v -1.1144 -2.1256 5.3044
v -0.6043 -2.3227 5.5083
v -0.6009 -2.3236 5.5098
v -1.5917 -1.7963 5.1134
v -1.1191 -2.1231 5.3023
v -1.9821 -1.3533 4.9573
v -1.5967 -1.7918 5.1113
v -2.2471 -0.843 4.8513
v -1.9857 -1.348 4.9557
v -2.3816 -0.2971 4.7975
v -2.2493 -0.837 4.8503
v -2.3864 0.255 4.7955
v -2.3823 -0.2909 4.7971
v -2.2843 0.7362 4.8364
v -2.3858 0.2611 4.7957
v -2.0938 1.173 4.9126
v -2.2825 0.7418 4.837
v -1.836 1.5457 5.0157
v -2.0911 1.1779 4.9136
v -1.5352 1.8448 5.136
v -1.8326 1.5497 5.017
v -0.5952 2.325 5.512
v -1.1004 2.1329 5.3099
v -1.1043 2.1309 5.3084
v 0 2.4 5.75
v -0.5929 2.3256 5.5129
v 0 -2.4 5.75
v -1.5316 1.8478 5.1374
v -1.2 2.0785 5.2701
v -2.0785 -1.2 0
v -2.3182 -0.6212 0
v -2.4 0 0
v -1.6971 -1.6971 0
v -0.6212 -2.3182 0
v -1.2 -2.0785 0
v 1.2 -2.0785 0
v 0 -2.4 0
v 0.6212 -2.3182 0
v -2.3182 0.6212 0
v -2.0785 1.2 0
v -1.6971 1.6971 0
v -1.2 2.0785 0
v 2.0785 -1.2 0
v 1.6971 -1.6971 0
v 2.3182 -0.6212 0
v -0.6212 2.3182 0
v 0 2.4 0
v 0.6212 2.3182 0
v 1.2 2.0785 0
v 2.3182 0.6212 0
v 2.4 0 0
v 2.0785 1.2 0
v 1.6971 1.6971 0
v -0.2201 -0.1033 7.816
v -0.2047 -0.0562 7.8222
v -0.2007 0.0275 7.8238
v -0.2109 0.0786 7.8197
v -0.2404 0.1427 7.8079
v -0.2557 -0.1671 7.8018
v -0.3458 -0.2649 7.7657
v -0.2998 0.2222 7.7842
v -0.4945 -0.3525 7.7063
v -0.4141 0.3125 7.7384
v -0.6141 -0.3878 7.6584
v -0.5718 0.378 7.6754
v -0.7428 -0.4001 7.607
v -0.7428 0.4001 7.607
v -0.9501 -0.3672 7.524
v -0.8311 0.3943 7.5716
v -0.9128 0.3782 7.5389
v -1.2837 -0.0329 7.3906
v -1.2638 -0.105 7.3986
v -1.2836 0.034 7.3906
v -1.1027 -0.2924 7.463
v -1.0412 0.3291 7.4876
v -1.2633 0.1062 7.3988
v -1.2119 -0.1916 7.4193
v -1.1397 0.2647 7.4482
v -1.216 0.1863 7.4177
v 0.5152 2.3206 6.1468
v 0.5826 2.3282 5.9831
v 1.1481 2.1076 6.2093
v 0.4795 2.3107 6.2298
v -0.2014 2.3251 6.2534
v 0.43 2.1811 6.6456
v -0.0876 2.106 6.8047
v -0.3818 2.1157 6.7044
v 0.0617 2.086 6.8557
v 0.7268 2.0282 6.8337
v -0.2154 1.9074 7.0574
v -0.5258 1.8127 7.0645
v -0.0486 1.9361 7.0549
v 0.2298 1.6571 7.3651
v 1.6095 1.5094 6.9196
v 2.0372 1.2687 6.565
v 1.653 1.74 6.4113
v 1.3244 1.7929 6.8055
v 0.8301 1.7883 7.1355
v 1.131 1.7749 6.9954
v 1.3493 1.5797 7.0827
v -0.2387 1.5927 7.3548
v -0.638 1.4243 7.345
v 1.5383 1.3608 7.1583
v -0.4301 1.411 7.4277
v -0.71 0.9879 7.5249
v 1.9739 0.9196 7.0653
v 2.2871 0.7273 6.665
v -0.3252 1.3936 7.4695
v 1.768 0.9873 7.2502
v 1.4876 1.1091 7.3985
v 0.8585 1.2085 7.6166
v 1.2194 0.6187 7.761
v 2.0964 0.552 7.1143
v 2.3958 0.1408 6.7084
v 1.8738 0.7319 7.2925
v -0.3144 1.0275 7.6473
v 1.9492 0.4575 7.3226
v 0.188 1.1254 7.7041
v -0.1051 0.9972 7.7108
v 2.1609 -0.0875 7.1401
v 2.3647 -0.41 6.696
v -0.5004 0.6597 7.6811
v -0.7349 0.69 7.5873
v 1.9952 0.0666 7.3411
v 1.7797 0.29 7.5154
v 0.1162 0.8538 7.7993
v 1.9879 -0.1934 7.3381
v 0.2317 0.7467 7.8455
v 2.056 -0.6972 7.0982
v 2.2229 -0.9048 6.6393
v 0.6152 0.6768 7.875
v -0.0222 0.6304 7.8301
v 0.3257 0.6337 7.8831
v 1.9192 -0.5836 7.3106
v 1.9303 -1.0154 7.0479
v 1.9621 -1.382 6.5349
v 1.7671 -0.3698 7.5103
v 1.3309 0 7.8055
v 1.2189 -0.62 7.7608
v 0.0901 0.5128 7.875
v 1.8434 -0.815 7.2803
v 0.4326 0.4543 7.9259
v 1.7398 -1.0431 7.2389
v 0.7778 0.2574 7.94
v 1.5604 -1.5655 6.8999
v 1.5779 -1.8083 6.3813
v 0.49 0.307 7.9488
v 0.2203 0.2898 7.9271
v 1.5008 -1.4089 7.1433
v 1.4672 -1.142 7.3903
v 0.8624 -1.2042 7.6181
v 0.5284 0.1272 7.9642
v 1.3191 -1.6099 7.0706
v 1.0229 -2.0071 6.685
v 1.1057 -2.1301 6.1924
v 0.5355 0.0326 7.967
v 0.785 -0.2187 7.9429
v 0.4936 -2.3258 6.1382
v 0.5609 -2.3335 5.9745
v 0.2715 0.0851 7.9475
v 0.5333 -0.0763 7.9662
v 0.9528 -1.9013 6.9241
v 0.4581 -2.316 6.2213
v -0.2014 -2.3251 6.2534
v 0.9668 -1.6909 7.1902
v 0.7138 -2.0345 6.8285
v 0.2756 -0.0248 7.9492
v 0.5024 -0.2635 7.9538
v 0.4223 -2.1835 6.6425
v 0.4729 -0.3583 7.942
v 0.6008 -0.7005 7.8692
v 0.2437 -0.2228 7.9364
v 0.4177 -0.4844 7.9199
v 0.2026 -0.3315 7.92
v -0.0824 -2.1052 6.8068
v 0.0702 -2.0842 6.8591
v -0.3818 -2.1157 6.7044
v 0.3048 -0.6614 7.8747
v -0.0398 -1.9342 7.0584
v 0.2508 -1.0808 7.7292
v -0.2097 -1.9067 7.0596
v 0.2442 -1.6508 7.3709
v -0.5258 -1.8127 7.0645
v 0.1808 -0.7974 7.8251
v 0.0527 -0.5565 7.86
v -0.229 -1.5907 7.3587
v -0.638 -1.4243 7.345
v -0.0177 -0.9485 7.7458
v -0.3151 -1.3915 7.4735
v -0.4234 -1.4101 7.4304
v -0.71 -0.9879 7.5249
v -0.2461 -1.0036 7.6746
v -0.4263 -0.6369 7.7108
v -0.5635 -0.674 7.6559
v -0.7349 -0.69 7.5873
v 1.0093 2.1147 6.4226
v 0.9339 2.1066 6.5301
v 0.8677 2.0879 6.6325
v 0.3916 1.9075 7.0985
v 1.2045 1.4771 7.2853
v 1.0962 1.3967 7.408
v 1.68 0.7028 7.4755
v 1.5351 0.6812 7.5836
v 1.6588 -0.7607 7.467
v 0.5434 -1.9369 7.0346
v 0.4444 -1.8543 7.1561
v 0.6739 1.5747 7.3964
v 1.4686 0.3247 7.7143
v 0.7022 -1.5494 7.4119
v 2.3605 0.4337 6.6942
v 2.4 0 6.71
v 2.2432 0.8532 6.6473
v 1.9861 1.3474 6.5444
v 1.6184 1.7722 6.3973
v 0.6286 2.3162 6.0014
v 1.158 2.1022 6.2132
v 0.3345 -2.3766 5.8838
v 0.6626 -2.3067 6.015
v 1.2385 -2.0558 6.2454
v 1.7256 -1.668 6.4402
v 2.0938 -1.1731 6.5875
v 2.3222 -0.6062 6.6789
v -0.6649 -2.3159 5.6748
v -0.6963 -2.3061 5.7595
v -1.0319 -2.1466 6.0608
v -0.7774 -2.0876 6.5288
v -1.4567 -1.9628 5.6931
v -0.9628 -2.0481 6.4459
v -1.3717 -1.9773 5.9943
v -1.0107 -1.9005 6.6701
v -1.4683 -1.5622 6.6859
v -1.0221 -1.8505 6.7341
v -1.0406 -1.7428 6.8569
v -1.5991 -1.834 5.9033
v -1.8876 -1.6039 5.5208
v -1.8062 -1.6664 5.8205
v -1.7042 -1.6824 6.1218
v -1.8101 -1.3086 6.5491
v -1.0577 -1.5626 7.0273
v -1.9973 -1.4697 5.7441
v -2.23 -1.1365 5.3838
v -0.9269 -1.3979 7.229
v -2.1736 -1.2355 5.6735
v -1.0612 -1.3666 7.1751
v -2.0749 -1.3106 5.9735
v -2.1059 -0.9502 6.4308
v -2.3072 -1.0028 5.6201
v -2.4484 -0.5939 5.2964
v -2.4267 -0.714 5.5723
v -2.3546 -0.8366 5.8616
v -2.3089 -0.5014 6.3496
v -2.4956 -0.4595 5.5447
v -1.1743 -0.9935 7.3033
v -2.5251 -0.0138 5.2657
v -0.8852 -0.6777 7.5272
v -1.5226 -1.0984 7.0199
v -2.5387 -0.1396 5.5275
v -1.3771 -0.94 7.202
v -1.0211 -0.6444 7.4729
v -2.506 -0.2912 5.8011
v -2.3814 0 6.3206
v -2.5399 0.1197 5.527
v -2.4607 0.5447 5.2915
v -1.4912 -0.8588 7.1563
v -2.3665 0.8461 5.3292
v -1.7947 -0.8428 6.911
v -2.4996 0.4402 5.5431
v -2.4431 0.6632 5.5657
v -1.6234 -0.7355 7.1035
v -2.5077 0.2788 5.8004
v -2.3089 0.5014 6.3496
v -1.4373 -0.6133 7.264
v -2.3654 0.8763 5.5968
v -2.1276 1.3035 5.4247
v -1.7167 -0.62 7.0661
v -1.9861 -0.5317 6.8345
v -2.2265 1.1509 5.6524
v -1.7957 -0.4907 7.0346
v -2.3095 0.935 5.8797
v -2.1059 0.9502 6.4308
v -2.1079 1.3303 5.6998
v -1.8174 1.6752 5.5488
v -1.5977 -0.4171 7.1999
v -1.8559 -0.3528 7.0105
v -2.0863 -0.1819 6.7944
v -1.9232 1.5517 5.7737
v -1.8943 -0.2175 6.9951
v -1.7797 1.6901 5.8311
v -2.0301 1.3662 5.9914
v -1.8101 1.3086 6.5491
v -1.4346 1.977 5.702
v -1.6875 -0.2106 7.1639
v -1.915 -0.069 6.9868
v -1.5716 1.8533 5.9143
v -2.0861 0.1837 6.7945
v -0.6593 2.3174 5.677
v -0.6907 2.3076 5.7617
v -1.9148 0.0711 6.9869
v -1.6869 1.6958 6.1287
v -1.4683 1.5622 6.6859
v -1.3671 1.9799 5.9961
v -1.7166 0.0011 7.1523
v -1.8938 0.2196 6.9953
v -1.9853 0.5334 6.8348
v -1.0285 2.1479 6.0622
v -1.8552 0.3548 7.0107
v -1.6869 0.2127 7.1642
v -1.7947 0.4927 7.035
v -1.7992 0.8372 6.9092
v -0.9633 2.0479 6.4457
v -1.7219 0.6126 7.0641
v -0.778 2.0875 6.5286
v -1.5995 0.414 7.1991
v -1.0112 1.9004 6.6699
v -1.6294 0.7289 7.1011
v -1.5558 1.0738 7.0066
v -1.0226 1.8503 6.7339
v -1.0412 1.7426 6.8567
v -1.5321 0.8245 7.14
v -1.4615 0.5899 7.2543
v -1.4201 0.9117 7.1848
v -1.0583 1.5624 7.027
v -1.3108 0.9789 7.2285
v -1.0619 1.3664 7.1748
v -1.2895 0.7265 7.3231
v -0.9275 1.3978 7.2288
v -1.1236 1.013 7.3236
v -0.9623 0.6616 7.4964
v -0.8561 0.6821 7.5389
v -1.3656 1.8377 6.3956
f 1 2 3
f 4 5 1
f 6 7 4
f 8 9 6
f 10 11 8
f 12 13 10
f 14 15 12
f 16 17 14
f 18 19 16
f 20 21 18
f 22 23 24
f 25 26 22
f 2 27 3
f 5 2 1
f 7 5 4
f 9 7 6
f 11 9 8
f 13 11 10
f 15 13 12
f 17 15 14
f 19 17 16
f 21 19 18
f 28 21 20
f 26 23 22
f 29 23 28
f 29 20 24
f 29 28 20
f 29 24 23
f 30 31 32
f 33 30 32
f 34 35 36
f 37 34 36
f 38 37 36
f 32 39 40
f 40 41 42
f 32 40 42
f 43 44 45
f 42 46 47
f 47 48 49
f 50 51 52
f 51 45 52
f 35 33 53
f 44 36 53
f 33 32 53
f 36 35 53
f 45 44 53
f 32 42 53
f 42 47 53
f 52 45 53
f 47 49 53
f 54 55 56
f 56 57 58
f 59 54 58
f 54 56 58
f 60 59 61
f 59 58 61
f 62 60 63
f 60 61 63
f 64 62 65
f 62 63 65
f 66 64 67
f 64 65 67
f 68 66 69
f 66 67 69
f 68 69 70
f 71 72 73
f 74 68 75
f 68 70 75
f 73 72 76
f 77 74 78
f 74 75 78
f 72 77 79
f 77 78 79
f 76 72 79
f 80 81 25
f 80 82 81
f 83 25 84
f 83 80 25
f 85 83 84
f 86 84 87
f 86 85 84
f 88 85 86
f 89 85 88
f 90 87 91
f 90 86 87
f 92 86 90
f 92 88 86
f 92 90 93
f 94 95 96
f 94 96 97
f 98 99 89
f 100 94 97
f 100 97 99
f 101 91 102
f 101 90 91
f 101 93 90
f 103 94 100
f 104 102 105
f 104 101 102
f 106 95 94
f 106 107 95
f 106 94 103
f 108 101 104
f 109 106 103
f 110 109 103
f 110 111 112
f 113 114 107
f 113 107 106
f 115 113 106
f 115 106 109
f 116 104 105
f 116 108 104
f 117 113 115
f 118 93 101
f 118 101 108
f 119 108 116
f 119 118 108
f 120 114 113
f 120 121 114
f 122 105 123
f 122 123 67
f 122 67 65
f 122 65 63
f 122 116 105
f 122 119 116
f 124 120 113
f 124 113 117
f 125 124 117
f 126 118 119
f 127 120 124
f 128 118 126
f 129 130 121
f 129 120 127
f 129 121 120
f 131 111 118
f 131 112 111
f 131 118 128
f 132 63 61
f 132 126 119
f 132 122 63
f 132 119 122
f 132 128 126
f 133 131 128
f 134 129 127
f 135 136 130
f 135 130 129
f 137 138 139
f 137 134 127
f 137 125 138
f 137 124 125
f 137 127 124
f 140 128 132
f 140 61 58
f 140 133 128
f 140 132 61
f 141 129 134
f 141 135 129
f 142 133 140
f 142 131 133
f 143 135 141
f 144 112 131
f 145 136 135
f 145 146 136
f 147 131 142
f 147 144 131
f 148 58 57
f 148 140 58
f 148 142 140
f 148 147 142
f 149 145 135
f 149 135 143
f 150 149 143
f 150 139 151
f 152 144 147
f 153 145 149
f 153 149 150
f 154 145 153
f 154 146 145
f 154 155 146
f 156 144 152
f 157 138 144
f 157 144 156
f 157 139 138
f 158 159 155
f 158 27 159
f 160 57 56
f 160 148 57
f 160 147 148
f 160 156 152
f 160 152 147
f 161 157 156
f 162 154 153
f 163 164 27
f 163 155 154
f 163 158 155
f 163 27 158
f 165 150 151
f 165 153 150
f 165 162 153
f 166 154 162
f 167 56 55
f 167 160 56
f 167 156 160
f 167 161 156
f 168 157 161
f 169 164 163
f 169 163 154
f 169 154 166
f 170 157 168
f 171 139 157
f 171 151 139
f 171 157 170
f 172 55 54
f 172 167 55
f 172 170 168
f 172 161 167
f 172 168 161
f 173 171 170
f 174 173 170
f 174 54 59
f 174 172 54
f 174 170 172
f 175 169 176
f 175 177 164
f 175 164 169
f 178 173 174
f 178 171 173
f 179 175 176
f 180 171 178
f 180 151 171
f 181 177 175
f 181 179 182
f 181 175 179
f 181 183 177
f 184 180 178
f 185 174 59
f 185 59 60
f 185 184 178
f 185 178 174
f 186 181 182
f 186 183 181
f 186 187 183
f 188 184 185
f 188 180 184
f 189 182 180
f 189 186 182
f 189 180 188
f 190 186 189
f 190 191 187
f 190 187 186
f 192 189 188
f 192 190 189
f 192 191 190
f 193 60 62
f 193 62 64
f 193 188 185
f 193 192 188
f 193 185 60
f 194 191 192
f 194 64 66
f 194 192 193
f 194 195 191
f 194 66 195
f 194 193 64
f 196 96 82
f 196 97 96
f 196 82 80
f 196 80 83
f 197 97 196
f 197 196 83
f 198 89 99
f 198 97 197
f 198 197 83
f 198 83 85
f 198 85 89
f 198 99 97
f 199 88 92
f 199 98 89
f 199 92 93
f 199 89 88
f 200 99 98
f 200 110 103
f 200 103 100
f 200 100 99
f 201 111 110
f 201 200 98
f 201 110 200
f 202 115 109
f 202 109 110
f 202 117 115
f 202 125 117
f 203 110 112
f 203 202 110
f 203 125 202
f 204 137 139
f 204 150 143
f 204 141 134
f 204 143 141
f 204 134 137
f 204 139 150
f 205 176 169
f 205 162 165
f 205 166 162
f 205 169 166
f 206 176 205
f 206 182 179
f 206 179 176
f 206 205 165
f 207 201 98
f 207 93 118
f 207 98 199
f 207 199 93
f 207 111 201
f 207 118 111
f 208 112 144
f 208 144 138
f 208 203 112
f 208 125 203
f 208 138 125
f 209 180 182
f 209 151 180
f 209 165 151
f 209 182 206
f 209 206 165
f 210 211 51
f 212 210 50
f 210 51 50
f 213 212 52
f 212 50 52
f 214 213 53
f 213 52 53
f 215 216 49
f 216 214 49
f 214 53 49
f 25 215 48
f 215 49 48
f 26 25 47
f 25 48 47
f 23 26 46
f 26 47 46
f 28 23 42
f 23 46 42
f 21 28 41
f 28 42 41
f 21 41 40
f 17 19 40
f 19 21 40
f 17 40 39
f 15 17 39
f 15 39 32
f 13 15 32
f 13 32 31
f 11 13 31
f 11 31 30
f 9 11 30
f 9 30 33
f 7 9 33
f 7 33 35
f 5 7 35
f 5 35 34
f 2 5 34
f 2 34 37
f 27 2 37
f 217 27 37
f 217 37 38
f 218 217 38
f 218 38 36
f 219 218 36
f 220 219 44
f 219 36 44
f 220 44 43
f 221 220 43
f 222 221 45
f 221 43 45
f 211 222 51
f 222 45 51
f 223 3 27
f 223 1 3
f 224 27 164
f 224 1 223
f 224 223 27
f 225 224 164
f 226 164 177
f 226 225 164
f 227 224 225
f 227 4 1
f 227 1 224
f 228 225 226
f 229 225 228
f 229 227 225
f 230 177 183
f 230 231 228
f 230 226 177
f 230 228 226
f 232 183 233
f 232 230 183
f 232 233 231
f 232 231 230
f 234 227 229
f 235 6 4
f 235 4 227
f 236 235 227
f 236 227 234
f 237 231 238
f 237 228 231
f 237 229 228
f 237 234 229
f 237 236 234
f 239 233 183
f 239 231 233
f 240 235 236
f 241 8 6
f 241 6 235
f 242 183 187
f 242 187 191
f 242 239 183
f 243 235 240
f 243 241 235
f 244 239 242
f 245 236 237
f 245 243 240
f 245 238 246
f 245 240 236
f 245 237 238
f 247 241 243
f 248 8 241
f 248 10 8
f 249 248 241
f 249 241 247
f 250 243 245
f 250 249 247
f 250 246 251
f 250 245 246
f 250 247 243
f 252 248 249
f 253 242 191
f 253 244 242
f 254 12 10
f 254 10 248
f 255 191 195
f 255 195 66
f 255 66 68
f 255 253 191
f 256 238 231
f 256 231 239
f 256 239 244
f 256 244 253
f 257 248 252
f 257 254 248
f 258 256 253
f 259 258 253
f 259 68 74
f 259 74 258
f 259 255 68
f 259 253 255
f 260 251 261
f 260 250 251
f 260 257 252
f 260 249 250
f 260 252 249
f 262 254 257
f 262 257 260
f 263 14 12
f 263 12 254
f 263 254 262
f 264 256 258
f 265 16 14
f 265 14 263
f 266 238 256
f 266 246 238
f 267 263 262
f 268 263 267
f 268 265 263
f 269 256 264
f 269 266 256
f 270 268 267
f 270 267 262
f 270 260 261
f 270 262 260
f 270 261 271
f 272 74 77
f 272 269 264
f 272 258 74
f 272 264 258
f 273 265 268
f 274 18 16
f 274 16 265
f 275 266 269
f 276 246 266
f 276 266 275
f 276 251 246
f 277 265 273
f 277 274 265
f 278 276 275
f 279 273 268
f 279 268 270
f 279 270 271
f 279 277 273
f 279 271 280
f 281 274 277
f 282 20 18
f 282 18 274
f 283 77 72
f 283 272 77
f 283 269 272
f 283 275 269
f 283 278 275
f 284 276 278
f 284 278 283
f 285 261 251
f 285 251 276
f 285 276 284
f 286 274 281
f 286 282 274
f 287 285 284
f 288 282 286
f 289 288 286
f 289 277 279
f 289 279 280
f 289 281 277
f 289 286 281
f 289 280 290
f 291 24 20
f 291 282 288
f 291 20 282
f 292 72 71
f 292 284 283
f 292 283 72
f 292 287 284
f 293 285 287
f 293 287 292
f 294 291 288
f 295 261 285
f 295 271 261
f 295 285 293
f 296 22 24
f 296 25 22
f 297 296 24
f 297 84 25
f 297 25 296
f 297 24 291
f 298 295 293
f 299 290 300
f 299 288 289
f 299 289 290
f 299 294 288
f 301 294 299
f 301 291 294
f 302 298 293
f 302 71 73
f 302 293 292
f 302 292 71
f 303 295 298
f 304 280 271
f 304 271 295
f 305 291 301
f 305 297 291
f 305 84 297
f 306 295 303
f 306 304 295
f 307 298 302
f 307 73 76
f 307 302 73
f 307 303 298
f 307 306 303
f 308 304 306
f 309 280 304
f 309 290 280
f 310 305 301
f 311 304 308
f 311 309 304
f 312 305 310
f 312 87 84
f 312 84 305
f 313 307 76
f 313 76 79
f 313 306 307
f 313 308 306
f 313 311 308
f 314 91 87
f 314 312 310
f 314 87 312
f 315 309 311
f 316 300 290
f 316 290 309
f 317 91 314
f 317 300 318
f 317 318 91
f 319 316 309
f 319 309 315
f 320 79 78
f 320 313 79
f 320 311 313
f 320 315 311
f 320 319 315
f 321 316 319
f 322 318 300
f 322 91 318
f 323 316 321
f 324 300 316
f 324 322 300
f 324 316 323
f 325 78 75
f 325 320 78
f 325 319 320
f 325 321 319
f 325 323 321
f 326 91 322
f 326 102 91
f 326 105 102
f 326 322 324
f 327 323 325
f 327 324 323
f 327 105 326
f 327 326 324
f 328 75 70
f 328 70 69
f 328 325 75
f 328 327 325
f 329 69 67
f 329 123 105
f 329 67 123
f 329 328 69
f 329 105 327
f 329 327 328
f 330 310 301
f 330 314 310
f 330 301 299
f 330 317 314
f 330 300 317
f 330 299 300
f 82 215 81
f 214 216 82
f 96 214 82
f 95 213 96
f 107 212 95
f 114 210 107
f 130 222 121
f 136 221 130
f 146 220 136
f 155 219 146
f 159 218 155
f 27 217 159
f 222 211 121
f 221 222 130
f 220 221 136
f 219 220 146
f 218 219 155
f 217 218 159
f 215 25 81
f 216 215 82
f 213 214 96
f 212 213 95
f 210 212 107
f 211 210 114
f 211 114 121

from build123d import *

# Parameters (mm, degrees)
F0_R     = 2.4
F1_DEPTH = 10
F3_DEPTH = 4
F5_DEPTH = 2
F6_R     = 1.9999


# Not quite as in the source:
# - a fillet or chamfer is up to 0.001 mm smaller than in the source, because OpenCascade refuses the exact size
# - a feature names something its author has since deleted; it is built from what else it names


with BuildPart() as f1:
    # F0 (on Top) → F1 (new body)
    with BuildSketch(Plane.XY):
        Circle(F0_R)
    extrude(amount=F1_DEPTH)

    # F2 (on Front) → F3 (cut, symmetric)
    with BuildSketch(Plane.XZ):
        Polygon((-2.5, 10.5), (-2.5, 4.75), (2.5, 6.75), (2.5, 10.5), align=None)
    extrude(amount=F3_DEPTH, both=True, mode=Mode.SUBTRACT)

    # F4 (on face) → F5 (join)
    with BuildSketch(Plane(origin=(-1.9827586207, 0, 4.9568965517), x_dir=(0.9284766909, 0, 0.3713906764), z_dir=(-0.3713906764, 0, 0.9284766909))):
        with BuildLine():
            add(Edge.make_bspline(
                [(2.135496578, 2.4), (4.7203754965, 2.3999998246), (4.7203754965, 0)],
                knots=[7.8915744057, 7.8915744057, 7.8915744057, 9.4247779608, 9.4247779608, 9.4247779608], degree=2, weights=[0.8038475615, 0.6339746132, 1]))
            add(Edge.make_bspline(
                [(2.1354967017, -2.4), (1.4428802648, -2.4000000778), (0.8430568353, -2.0784609691), (-3.0342618258, 0), (0.8430568353, 2.0784609691), (1.4428802074, 2.400000047), (2.135496578, 2.4)],
                knots=[4.6747961621, 4.6747961621, 4.6747961621, 5.235987756, 5.235987756, 7.3303828584, 7.3303828584, 7.8915744057, 7.8915744057, 7.8915744057], degree=2, weights=[0.8038475512, 0.8660253757, 1, 0.5, 1, 0.8660253868, 0.8038475615]))
            add(Edge.make_bspline(
                [(4.7203754965, 0), (4.7203754965, -2.3999997097), (2.1354967017, -2.4)],
                knots=[3.1415926536, 3.1415926536, 3.1415926536, 4.6747961621, 4.6747961621, 4.6747961621], degree=2, weights=[1, 0.6339746243, 0.8038475512]))
        make_face()
    extrude(amount=F5_DEPTH)

    # F6 (radius 2 in the source; OpenCascade refuses exactly that, so slightly less here)
    f6_edges = [f1.edges().sort_by_distance(p)[0] for p in [
        (1.029171, -1.618698, 8.315734),
        (-3.142781, 0, 6.646953),
        (1.029171, 1.618698, 8.315734),
    ]]
    fillet(f6_edges, radius=F6_R)


solid = f1.part
